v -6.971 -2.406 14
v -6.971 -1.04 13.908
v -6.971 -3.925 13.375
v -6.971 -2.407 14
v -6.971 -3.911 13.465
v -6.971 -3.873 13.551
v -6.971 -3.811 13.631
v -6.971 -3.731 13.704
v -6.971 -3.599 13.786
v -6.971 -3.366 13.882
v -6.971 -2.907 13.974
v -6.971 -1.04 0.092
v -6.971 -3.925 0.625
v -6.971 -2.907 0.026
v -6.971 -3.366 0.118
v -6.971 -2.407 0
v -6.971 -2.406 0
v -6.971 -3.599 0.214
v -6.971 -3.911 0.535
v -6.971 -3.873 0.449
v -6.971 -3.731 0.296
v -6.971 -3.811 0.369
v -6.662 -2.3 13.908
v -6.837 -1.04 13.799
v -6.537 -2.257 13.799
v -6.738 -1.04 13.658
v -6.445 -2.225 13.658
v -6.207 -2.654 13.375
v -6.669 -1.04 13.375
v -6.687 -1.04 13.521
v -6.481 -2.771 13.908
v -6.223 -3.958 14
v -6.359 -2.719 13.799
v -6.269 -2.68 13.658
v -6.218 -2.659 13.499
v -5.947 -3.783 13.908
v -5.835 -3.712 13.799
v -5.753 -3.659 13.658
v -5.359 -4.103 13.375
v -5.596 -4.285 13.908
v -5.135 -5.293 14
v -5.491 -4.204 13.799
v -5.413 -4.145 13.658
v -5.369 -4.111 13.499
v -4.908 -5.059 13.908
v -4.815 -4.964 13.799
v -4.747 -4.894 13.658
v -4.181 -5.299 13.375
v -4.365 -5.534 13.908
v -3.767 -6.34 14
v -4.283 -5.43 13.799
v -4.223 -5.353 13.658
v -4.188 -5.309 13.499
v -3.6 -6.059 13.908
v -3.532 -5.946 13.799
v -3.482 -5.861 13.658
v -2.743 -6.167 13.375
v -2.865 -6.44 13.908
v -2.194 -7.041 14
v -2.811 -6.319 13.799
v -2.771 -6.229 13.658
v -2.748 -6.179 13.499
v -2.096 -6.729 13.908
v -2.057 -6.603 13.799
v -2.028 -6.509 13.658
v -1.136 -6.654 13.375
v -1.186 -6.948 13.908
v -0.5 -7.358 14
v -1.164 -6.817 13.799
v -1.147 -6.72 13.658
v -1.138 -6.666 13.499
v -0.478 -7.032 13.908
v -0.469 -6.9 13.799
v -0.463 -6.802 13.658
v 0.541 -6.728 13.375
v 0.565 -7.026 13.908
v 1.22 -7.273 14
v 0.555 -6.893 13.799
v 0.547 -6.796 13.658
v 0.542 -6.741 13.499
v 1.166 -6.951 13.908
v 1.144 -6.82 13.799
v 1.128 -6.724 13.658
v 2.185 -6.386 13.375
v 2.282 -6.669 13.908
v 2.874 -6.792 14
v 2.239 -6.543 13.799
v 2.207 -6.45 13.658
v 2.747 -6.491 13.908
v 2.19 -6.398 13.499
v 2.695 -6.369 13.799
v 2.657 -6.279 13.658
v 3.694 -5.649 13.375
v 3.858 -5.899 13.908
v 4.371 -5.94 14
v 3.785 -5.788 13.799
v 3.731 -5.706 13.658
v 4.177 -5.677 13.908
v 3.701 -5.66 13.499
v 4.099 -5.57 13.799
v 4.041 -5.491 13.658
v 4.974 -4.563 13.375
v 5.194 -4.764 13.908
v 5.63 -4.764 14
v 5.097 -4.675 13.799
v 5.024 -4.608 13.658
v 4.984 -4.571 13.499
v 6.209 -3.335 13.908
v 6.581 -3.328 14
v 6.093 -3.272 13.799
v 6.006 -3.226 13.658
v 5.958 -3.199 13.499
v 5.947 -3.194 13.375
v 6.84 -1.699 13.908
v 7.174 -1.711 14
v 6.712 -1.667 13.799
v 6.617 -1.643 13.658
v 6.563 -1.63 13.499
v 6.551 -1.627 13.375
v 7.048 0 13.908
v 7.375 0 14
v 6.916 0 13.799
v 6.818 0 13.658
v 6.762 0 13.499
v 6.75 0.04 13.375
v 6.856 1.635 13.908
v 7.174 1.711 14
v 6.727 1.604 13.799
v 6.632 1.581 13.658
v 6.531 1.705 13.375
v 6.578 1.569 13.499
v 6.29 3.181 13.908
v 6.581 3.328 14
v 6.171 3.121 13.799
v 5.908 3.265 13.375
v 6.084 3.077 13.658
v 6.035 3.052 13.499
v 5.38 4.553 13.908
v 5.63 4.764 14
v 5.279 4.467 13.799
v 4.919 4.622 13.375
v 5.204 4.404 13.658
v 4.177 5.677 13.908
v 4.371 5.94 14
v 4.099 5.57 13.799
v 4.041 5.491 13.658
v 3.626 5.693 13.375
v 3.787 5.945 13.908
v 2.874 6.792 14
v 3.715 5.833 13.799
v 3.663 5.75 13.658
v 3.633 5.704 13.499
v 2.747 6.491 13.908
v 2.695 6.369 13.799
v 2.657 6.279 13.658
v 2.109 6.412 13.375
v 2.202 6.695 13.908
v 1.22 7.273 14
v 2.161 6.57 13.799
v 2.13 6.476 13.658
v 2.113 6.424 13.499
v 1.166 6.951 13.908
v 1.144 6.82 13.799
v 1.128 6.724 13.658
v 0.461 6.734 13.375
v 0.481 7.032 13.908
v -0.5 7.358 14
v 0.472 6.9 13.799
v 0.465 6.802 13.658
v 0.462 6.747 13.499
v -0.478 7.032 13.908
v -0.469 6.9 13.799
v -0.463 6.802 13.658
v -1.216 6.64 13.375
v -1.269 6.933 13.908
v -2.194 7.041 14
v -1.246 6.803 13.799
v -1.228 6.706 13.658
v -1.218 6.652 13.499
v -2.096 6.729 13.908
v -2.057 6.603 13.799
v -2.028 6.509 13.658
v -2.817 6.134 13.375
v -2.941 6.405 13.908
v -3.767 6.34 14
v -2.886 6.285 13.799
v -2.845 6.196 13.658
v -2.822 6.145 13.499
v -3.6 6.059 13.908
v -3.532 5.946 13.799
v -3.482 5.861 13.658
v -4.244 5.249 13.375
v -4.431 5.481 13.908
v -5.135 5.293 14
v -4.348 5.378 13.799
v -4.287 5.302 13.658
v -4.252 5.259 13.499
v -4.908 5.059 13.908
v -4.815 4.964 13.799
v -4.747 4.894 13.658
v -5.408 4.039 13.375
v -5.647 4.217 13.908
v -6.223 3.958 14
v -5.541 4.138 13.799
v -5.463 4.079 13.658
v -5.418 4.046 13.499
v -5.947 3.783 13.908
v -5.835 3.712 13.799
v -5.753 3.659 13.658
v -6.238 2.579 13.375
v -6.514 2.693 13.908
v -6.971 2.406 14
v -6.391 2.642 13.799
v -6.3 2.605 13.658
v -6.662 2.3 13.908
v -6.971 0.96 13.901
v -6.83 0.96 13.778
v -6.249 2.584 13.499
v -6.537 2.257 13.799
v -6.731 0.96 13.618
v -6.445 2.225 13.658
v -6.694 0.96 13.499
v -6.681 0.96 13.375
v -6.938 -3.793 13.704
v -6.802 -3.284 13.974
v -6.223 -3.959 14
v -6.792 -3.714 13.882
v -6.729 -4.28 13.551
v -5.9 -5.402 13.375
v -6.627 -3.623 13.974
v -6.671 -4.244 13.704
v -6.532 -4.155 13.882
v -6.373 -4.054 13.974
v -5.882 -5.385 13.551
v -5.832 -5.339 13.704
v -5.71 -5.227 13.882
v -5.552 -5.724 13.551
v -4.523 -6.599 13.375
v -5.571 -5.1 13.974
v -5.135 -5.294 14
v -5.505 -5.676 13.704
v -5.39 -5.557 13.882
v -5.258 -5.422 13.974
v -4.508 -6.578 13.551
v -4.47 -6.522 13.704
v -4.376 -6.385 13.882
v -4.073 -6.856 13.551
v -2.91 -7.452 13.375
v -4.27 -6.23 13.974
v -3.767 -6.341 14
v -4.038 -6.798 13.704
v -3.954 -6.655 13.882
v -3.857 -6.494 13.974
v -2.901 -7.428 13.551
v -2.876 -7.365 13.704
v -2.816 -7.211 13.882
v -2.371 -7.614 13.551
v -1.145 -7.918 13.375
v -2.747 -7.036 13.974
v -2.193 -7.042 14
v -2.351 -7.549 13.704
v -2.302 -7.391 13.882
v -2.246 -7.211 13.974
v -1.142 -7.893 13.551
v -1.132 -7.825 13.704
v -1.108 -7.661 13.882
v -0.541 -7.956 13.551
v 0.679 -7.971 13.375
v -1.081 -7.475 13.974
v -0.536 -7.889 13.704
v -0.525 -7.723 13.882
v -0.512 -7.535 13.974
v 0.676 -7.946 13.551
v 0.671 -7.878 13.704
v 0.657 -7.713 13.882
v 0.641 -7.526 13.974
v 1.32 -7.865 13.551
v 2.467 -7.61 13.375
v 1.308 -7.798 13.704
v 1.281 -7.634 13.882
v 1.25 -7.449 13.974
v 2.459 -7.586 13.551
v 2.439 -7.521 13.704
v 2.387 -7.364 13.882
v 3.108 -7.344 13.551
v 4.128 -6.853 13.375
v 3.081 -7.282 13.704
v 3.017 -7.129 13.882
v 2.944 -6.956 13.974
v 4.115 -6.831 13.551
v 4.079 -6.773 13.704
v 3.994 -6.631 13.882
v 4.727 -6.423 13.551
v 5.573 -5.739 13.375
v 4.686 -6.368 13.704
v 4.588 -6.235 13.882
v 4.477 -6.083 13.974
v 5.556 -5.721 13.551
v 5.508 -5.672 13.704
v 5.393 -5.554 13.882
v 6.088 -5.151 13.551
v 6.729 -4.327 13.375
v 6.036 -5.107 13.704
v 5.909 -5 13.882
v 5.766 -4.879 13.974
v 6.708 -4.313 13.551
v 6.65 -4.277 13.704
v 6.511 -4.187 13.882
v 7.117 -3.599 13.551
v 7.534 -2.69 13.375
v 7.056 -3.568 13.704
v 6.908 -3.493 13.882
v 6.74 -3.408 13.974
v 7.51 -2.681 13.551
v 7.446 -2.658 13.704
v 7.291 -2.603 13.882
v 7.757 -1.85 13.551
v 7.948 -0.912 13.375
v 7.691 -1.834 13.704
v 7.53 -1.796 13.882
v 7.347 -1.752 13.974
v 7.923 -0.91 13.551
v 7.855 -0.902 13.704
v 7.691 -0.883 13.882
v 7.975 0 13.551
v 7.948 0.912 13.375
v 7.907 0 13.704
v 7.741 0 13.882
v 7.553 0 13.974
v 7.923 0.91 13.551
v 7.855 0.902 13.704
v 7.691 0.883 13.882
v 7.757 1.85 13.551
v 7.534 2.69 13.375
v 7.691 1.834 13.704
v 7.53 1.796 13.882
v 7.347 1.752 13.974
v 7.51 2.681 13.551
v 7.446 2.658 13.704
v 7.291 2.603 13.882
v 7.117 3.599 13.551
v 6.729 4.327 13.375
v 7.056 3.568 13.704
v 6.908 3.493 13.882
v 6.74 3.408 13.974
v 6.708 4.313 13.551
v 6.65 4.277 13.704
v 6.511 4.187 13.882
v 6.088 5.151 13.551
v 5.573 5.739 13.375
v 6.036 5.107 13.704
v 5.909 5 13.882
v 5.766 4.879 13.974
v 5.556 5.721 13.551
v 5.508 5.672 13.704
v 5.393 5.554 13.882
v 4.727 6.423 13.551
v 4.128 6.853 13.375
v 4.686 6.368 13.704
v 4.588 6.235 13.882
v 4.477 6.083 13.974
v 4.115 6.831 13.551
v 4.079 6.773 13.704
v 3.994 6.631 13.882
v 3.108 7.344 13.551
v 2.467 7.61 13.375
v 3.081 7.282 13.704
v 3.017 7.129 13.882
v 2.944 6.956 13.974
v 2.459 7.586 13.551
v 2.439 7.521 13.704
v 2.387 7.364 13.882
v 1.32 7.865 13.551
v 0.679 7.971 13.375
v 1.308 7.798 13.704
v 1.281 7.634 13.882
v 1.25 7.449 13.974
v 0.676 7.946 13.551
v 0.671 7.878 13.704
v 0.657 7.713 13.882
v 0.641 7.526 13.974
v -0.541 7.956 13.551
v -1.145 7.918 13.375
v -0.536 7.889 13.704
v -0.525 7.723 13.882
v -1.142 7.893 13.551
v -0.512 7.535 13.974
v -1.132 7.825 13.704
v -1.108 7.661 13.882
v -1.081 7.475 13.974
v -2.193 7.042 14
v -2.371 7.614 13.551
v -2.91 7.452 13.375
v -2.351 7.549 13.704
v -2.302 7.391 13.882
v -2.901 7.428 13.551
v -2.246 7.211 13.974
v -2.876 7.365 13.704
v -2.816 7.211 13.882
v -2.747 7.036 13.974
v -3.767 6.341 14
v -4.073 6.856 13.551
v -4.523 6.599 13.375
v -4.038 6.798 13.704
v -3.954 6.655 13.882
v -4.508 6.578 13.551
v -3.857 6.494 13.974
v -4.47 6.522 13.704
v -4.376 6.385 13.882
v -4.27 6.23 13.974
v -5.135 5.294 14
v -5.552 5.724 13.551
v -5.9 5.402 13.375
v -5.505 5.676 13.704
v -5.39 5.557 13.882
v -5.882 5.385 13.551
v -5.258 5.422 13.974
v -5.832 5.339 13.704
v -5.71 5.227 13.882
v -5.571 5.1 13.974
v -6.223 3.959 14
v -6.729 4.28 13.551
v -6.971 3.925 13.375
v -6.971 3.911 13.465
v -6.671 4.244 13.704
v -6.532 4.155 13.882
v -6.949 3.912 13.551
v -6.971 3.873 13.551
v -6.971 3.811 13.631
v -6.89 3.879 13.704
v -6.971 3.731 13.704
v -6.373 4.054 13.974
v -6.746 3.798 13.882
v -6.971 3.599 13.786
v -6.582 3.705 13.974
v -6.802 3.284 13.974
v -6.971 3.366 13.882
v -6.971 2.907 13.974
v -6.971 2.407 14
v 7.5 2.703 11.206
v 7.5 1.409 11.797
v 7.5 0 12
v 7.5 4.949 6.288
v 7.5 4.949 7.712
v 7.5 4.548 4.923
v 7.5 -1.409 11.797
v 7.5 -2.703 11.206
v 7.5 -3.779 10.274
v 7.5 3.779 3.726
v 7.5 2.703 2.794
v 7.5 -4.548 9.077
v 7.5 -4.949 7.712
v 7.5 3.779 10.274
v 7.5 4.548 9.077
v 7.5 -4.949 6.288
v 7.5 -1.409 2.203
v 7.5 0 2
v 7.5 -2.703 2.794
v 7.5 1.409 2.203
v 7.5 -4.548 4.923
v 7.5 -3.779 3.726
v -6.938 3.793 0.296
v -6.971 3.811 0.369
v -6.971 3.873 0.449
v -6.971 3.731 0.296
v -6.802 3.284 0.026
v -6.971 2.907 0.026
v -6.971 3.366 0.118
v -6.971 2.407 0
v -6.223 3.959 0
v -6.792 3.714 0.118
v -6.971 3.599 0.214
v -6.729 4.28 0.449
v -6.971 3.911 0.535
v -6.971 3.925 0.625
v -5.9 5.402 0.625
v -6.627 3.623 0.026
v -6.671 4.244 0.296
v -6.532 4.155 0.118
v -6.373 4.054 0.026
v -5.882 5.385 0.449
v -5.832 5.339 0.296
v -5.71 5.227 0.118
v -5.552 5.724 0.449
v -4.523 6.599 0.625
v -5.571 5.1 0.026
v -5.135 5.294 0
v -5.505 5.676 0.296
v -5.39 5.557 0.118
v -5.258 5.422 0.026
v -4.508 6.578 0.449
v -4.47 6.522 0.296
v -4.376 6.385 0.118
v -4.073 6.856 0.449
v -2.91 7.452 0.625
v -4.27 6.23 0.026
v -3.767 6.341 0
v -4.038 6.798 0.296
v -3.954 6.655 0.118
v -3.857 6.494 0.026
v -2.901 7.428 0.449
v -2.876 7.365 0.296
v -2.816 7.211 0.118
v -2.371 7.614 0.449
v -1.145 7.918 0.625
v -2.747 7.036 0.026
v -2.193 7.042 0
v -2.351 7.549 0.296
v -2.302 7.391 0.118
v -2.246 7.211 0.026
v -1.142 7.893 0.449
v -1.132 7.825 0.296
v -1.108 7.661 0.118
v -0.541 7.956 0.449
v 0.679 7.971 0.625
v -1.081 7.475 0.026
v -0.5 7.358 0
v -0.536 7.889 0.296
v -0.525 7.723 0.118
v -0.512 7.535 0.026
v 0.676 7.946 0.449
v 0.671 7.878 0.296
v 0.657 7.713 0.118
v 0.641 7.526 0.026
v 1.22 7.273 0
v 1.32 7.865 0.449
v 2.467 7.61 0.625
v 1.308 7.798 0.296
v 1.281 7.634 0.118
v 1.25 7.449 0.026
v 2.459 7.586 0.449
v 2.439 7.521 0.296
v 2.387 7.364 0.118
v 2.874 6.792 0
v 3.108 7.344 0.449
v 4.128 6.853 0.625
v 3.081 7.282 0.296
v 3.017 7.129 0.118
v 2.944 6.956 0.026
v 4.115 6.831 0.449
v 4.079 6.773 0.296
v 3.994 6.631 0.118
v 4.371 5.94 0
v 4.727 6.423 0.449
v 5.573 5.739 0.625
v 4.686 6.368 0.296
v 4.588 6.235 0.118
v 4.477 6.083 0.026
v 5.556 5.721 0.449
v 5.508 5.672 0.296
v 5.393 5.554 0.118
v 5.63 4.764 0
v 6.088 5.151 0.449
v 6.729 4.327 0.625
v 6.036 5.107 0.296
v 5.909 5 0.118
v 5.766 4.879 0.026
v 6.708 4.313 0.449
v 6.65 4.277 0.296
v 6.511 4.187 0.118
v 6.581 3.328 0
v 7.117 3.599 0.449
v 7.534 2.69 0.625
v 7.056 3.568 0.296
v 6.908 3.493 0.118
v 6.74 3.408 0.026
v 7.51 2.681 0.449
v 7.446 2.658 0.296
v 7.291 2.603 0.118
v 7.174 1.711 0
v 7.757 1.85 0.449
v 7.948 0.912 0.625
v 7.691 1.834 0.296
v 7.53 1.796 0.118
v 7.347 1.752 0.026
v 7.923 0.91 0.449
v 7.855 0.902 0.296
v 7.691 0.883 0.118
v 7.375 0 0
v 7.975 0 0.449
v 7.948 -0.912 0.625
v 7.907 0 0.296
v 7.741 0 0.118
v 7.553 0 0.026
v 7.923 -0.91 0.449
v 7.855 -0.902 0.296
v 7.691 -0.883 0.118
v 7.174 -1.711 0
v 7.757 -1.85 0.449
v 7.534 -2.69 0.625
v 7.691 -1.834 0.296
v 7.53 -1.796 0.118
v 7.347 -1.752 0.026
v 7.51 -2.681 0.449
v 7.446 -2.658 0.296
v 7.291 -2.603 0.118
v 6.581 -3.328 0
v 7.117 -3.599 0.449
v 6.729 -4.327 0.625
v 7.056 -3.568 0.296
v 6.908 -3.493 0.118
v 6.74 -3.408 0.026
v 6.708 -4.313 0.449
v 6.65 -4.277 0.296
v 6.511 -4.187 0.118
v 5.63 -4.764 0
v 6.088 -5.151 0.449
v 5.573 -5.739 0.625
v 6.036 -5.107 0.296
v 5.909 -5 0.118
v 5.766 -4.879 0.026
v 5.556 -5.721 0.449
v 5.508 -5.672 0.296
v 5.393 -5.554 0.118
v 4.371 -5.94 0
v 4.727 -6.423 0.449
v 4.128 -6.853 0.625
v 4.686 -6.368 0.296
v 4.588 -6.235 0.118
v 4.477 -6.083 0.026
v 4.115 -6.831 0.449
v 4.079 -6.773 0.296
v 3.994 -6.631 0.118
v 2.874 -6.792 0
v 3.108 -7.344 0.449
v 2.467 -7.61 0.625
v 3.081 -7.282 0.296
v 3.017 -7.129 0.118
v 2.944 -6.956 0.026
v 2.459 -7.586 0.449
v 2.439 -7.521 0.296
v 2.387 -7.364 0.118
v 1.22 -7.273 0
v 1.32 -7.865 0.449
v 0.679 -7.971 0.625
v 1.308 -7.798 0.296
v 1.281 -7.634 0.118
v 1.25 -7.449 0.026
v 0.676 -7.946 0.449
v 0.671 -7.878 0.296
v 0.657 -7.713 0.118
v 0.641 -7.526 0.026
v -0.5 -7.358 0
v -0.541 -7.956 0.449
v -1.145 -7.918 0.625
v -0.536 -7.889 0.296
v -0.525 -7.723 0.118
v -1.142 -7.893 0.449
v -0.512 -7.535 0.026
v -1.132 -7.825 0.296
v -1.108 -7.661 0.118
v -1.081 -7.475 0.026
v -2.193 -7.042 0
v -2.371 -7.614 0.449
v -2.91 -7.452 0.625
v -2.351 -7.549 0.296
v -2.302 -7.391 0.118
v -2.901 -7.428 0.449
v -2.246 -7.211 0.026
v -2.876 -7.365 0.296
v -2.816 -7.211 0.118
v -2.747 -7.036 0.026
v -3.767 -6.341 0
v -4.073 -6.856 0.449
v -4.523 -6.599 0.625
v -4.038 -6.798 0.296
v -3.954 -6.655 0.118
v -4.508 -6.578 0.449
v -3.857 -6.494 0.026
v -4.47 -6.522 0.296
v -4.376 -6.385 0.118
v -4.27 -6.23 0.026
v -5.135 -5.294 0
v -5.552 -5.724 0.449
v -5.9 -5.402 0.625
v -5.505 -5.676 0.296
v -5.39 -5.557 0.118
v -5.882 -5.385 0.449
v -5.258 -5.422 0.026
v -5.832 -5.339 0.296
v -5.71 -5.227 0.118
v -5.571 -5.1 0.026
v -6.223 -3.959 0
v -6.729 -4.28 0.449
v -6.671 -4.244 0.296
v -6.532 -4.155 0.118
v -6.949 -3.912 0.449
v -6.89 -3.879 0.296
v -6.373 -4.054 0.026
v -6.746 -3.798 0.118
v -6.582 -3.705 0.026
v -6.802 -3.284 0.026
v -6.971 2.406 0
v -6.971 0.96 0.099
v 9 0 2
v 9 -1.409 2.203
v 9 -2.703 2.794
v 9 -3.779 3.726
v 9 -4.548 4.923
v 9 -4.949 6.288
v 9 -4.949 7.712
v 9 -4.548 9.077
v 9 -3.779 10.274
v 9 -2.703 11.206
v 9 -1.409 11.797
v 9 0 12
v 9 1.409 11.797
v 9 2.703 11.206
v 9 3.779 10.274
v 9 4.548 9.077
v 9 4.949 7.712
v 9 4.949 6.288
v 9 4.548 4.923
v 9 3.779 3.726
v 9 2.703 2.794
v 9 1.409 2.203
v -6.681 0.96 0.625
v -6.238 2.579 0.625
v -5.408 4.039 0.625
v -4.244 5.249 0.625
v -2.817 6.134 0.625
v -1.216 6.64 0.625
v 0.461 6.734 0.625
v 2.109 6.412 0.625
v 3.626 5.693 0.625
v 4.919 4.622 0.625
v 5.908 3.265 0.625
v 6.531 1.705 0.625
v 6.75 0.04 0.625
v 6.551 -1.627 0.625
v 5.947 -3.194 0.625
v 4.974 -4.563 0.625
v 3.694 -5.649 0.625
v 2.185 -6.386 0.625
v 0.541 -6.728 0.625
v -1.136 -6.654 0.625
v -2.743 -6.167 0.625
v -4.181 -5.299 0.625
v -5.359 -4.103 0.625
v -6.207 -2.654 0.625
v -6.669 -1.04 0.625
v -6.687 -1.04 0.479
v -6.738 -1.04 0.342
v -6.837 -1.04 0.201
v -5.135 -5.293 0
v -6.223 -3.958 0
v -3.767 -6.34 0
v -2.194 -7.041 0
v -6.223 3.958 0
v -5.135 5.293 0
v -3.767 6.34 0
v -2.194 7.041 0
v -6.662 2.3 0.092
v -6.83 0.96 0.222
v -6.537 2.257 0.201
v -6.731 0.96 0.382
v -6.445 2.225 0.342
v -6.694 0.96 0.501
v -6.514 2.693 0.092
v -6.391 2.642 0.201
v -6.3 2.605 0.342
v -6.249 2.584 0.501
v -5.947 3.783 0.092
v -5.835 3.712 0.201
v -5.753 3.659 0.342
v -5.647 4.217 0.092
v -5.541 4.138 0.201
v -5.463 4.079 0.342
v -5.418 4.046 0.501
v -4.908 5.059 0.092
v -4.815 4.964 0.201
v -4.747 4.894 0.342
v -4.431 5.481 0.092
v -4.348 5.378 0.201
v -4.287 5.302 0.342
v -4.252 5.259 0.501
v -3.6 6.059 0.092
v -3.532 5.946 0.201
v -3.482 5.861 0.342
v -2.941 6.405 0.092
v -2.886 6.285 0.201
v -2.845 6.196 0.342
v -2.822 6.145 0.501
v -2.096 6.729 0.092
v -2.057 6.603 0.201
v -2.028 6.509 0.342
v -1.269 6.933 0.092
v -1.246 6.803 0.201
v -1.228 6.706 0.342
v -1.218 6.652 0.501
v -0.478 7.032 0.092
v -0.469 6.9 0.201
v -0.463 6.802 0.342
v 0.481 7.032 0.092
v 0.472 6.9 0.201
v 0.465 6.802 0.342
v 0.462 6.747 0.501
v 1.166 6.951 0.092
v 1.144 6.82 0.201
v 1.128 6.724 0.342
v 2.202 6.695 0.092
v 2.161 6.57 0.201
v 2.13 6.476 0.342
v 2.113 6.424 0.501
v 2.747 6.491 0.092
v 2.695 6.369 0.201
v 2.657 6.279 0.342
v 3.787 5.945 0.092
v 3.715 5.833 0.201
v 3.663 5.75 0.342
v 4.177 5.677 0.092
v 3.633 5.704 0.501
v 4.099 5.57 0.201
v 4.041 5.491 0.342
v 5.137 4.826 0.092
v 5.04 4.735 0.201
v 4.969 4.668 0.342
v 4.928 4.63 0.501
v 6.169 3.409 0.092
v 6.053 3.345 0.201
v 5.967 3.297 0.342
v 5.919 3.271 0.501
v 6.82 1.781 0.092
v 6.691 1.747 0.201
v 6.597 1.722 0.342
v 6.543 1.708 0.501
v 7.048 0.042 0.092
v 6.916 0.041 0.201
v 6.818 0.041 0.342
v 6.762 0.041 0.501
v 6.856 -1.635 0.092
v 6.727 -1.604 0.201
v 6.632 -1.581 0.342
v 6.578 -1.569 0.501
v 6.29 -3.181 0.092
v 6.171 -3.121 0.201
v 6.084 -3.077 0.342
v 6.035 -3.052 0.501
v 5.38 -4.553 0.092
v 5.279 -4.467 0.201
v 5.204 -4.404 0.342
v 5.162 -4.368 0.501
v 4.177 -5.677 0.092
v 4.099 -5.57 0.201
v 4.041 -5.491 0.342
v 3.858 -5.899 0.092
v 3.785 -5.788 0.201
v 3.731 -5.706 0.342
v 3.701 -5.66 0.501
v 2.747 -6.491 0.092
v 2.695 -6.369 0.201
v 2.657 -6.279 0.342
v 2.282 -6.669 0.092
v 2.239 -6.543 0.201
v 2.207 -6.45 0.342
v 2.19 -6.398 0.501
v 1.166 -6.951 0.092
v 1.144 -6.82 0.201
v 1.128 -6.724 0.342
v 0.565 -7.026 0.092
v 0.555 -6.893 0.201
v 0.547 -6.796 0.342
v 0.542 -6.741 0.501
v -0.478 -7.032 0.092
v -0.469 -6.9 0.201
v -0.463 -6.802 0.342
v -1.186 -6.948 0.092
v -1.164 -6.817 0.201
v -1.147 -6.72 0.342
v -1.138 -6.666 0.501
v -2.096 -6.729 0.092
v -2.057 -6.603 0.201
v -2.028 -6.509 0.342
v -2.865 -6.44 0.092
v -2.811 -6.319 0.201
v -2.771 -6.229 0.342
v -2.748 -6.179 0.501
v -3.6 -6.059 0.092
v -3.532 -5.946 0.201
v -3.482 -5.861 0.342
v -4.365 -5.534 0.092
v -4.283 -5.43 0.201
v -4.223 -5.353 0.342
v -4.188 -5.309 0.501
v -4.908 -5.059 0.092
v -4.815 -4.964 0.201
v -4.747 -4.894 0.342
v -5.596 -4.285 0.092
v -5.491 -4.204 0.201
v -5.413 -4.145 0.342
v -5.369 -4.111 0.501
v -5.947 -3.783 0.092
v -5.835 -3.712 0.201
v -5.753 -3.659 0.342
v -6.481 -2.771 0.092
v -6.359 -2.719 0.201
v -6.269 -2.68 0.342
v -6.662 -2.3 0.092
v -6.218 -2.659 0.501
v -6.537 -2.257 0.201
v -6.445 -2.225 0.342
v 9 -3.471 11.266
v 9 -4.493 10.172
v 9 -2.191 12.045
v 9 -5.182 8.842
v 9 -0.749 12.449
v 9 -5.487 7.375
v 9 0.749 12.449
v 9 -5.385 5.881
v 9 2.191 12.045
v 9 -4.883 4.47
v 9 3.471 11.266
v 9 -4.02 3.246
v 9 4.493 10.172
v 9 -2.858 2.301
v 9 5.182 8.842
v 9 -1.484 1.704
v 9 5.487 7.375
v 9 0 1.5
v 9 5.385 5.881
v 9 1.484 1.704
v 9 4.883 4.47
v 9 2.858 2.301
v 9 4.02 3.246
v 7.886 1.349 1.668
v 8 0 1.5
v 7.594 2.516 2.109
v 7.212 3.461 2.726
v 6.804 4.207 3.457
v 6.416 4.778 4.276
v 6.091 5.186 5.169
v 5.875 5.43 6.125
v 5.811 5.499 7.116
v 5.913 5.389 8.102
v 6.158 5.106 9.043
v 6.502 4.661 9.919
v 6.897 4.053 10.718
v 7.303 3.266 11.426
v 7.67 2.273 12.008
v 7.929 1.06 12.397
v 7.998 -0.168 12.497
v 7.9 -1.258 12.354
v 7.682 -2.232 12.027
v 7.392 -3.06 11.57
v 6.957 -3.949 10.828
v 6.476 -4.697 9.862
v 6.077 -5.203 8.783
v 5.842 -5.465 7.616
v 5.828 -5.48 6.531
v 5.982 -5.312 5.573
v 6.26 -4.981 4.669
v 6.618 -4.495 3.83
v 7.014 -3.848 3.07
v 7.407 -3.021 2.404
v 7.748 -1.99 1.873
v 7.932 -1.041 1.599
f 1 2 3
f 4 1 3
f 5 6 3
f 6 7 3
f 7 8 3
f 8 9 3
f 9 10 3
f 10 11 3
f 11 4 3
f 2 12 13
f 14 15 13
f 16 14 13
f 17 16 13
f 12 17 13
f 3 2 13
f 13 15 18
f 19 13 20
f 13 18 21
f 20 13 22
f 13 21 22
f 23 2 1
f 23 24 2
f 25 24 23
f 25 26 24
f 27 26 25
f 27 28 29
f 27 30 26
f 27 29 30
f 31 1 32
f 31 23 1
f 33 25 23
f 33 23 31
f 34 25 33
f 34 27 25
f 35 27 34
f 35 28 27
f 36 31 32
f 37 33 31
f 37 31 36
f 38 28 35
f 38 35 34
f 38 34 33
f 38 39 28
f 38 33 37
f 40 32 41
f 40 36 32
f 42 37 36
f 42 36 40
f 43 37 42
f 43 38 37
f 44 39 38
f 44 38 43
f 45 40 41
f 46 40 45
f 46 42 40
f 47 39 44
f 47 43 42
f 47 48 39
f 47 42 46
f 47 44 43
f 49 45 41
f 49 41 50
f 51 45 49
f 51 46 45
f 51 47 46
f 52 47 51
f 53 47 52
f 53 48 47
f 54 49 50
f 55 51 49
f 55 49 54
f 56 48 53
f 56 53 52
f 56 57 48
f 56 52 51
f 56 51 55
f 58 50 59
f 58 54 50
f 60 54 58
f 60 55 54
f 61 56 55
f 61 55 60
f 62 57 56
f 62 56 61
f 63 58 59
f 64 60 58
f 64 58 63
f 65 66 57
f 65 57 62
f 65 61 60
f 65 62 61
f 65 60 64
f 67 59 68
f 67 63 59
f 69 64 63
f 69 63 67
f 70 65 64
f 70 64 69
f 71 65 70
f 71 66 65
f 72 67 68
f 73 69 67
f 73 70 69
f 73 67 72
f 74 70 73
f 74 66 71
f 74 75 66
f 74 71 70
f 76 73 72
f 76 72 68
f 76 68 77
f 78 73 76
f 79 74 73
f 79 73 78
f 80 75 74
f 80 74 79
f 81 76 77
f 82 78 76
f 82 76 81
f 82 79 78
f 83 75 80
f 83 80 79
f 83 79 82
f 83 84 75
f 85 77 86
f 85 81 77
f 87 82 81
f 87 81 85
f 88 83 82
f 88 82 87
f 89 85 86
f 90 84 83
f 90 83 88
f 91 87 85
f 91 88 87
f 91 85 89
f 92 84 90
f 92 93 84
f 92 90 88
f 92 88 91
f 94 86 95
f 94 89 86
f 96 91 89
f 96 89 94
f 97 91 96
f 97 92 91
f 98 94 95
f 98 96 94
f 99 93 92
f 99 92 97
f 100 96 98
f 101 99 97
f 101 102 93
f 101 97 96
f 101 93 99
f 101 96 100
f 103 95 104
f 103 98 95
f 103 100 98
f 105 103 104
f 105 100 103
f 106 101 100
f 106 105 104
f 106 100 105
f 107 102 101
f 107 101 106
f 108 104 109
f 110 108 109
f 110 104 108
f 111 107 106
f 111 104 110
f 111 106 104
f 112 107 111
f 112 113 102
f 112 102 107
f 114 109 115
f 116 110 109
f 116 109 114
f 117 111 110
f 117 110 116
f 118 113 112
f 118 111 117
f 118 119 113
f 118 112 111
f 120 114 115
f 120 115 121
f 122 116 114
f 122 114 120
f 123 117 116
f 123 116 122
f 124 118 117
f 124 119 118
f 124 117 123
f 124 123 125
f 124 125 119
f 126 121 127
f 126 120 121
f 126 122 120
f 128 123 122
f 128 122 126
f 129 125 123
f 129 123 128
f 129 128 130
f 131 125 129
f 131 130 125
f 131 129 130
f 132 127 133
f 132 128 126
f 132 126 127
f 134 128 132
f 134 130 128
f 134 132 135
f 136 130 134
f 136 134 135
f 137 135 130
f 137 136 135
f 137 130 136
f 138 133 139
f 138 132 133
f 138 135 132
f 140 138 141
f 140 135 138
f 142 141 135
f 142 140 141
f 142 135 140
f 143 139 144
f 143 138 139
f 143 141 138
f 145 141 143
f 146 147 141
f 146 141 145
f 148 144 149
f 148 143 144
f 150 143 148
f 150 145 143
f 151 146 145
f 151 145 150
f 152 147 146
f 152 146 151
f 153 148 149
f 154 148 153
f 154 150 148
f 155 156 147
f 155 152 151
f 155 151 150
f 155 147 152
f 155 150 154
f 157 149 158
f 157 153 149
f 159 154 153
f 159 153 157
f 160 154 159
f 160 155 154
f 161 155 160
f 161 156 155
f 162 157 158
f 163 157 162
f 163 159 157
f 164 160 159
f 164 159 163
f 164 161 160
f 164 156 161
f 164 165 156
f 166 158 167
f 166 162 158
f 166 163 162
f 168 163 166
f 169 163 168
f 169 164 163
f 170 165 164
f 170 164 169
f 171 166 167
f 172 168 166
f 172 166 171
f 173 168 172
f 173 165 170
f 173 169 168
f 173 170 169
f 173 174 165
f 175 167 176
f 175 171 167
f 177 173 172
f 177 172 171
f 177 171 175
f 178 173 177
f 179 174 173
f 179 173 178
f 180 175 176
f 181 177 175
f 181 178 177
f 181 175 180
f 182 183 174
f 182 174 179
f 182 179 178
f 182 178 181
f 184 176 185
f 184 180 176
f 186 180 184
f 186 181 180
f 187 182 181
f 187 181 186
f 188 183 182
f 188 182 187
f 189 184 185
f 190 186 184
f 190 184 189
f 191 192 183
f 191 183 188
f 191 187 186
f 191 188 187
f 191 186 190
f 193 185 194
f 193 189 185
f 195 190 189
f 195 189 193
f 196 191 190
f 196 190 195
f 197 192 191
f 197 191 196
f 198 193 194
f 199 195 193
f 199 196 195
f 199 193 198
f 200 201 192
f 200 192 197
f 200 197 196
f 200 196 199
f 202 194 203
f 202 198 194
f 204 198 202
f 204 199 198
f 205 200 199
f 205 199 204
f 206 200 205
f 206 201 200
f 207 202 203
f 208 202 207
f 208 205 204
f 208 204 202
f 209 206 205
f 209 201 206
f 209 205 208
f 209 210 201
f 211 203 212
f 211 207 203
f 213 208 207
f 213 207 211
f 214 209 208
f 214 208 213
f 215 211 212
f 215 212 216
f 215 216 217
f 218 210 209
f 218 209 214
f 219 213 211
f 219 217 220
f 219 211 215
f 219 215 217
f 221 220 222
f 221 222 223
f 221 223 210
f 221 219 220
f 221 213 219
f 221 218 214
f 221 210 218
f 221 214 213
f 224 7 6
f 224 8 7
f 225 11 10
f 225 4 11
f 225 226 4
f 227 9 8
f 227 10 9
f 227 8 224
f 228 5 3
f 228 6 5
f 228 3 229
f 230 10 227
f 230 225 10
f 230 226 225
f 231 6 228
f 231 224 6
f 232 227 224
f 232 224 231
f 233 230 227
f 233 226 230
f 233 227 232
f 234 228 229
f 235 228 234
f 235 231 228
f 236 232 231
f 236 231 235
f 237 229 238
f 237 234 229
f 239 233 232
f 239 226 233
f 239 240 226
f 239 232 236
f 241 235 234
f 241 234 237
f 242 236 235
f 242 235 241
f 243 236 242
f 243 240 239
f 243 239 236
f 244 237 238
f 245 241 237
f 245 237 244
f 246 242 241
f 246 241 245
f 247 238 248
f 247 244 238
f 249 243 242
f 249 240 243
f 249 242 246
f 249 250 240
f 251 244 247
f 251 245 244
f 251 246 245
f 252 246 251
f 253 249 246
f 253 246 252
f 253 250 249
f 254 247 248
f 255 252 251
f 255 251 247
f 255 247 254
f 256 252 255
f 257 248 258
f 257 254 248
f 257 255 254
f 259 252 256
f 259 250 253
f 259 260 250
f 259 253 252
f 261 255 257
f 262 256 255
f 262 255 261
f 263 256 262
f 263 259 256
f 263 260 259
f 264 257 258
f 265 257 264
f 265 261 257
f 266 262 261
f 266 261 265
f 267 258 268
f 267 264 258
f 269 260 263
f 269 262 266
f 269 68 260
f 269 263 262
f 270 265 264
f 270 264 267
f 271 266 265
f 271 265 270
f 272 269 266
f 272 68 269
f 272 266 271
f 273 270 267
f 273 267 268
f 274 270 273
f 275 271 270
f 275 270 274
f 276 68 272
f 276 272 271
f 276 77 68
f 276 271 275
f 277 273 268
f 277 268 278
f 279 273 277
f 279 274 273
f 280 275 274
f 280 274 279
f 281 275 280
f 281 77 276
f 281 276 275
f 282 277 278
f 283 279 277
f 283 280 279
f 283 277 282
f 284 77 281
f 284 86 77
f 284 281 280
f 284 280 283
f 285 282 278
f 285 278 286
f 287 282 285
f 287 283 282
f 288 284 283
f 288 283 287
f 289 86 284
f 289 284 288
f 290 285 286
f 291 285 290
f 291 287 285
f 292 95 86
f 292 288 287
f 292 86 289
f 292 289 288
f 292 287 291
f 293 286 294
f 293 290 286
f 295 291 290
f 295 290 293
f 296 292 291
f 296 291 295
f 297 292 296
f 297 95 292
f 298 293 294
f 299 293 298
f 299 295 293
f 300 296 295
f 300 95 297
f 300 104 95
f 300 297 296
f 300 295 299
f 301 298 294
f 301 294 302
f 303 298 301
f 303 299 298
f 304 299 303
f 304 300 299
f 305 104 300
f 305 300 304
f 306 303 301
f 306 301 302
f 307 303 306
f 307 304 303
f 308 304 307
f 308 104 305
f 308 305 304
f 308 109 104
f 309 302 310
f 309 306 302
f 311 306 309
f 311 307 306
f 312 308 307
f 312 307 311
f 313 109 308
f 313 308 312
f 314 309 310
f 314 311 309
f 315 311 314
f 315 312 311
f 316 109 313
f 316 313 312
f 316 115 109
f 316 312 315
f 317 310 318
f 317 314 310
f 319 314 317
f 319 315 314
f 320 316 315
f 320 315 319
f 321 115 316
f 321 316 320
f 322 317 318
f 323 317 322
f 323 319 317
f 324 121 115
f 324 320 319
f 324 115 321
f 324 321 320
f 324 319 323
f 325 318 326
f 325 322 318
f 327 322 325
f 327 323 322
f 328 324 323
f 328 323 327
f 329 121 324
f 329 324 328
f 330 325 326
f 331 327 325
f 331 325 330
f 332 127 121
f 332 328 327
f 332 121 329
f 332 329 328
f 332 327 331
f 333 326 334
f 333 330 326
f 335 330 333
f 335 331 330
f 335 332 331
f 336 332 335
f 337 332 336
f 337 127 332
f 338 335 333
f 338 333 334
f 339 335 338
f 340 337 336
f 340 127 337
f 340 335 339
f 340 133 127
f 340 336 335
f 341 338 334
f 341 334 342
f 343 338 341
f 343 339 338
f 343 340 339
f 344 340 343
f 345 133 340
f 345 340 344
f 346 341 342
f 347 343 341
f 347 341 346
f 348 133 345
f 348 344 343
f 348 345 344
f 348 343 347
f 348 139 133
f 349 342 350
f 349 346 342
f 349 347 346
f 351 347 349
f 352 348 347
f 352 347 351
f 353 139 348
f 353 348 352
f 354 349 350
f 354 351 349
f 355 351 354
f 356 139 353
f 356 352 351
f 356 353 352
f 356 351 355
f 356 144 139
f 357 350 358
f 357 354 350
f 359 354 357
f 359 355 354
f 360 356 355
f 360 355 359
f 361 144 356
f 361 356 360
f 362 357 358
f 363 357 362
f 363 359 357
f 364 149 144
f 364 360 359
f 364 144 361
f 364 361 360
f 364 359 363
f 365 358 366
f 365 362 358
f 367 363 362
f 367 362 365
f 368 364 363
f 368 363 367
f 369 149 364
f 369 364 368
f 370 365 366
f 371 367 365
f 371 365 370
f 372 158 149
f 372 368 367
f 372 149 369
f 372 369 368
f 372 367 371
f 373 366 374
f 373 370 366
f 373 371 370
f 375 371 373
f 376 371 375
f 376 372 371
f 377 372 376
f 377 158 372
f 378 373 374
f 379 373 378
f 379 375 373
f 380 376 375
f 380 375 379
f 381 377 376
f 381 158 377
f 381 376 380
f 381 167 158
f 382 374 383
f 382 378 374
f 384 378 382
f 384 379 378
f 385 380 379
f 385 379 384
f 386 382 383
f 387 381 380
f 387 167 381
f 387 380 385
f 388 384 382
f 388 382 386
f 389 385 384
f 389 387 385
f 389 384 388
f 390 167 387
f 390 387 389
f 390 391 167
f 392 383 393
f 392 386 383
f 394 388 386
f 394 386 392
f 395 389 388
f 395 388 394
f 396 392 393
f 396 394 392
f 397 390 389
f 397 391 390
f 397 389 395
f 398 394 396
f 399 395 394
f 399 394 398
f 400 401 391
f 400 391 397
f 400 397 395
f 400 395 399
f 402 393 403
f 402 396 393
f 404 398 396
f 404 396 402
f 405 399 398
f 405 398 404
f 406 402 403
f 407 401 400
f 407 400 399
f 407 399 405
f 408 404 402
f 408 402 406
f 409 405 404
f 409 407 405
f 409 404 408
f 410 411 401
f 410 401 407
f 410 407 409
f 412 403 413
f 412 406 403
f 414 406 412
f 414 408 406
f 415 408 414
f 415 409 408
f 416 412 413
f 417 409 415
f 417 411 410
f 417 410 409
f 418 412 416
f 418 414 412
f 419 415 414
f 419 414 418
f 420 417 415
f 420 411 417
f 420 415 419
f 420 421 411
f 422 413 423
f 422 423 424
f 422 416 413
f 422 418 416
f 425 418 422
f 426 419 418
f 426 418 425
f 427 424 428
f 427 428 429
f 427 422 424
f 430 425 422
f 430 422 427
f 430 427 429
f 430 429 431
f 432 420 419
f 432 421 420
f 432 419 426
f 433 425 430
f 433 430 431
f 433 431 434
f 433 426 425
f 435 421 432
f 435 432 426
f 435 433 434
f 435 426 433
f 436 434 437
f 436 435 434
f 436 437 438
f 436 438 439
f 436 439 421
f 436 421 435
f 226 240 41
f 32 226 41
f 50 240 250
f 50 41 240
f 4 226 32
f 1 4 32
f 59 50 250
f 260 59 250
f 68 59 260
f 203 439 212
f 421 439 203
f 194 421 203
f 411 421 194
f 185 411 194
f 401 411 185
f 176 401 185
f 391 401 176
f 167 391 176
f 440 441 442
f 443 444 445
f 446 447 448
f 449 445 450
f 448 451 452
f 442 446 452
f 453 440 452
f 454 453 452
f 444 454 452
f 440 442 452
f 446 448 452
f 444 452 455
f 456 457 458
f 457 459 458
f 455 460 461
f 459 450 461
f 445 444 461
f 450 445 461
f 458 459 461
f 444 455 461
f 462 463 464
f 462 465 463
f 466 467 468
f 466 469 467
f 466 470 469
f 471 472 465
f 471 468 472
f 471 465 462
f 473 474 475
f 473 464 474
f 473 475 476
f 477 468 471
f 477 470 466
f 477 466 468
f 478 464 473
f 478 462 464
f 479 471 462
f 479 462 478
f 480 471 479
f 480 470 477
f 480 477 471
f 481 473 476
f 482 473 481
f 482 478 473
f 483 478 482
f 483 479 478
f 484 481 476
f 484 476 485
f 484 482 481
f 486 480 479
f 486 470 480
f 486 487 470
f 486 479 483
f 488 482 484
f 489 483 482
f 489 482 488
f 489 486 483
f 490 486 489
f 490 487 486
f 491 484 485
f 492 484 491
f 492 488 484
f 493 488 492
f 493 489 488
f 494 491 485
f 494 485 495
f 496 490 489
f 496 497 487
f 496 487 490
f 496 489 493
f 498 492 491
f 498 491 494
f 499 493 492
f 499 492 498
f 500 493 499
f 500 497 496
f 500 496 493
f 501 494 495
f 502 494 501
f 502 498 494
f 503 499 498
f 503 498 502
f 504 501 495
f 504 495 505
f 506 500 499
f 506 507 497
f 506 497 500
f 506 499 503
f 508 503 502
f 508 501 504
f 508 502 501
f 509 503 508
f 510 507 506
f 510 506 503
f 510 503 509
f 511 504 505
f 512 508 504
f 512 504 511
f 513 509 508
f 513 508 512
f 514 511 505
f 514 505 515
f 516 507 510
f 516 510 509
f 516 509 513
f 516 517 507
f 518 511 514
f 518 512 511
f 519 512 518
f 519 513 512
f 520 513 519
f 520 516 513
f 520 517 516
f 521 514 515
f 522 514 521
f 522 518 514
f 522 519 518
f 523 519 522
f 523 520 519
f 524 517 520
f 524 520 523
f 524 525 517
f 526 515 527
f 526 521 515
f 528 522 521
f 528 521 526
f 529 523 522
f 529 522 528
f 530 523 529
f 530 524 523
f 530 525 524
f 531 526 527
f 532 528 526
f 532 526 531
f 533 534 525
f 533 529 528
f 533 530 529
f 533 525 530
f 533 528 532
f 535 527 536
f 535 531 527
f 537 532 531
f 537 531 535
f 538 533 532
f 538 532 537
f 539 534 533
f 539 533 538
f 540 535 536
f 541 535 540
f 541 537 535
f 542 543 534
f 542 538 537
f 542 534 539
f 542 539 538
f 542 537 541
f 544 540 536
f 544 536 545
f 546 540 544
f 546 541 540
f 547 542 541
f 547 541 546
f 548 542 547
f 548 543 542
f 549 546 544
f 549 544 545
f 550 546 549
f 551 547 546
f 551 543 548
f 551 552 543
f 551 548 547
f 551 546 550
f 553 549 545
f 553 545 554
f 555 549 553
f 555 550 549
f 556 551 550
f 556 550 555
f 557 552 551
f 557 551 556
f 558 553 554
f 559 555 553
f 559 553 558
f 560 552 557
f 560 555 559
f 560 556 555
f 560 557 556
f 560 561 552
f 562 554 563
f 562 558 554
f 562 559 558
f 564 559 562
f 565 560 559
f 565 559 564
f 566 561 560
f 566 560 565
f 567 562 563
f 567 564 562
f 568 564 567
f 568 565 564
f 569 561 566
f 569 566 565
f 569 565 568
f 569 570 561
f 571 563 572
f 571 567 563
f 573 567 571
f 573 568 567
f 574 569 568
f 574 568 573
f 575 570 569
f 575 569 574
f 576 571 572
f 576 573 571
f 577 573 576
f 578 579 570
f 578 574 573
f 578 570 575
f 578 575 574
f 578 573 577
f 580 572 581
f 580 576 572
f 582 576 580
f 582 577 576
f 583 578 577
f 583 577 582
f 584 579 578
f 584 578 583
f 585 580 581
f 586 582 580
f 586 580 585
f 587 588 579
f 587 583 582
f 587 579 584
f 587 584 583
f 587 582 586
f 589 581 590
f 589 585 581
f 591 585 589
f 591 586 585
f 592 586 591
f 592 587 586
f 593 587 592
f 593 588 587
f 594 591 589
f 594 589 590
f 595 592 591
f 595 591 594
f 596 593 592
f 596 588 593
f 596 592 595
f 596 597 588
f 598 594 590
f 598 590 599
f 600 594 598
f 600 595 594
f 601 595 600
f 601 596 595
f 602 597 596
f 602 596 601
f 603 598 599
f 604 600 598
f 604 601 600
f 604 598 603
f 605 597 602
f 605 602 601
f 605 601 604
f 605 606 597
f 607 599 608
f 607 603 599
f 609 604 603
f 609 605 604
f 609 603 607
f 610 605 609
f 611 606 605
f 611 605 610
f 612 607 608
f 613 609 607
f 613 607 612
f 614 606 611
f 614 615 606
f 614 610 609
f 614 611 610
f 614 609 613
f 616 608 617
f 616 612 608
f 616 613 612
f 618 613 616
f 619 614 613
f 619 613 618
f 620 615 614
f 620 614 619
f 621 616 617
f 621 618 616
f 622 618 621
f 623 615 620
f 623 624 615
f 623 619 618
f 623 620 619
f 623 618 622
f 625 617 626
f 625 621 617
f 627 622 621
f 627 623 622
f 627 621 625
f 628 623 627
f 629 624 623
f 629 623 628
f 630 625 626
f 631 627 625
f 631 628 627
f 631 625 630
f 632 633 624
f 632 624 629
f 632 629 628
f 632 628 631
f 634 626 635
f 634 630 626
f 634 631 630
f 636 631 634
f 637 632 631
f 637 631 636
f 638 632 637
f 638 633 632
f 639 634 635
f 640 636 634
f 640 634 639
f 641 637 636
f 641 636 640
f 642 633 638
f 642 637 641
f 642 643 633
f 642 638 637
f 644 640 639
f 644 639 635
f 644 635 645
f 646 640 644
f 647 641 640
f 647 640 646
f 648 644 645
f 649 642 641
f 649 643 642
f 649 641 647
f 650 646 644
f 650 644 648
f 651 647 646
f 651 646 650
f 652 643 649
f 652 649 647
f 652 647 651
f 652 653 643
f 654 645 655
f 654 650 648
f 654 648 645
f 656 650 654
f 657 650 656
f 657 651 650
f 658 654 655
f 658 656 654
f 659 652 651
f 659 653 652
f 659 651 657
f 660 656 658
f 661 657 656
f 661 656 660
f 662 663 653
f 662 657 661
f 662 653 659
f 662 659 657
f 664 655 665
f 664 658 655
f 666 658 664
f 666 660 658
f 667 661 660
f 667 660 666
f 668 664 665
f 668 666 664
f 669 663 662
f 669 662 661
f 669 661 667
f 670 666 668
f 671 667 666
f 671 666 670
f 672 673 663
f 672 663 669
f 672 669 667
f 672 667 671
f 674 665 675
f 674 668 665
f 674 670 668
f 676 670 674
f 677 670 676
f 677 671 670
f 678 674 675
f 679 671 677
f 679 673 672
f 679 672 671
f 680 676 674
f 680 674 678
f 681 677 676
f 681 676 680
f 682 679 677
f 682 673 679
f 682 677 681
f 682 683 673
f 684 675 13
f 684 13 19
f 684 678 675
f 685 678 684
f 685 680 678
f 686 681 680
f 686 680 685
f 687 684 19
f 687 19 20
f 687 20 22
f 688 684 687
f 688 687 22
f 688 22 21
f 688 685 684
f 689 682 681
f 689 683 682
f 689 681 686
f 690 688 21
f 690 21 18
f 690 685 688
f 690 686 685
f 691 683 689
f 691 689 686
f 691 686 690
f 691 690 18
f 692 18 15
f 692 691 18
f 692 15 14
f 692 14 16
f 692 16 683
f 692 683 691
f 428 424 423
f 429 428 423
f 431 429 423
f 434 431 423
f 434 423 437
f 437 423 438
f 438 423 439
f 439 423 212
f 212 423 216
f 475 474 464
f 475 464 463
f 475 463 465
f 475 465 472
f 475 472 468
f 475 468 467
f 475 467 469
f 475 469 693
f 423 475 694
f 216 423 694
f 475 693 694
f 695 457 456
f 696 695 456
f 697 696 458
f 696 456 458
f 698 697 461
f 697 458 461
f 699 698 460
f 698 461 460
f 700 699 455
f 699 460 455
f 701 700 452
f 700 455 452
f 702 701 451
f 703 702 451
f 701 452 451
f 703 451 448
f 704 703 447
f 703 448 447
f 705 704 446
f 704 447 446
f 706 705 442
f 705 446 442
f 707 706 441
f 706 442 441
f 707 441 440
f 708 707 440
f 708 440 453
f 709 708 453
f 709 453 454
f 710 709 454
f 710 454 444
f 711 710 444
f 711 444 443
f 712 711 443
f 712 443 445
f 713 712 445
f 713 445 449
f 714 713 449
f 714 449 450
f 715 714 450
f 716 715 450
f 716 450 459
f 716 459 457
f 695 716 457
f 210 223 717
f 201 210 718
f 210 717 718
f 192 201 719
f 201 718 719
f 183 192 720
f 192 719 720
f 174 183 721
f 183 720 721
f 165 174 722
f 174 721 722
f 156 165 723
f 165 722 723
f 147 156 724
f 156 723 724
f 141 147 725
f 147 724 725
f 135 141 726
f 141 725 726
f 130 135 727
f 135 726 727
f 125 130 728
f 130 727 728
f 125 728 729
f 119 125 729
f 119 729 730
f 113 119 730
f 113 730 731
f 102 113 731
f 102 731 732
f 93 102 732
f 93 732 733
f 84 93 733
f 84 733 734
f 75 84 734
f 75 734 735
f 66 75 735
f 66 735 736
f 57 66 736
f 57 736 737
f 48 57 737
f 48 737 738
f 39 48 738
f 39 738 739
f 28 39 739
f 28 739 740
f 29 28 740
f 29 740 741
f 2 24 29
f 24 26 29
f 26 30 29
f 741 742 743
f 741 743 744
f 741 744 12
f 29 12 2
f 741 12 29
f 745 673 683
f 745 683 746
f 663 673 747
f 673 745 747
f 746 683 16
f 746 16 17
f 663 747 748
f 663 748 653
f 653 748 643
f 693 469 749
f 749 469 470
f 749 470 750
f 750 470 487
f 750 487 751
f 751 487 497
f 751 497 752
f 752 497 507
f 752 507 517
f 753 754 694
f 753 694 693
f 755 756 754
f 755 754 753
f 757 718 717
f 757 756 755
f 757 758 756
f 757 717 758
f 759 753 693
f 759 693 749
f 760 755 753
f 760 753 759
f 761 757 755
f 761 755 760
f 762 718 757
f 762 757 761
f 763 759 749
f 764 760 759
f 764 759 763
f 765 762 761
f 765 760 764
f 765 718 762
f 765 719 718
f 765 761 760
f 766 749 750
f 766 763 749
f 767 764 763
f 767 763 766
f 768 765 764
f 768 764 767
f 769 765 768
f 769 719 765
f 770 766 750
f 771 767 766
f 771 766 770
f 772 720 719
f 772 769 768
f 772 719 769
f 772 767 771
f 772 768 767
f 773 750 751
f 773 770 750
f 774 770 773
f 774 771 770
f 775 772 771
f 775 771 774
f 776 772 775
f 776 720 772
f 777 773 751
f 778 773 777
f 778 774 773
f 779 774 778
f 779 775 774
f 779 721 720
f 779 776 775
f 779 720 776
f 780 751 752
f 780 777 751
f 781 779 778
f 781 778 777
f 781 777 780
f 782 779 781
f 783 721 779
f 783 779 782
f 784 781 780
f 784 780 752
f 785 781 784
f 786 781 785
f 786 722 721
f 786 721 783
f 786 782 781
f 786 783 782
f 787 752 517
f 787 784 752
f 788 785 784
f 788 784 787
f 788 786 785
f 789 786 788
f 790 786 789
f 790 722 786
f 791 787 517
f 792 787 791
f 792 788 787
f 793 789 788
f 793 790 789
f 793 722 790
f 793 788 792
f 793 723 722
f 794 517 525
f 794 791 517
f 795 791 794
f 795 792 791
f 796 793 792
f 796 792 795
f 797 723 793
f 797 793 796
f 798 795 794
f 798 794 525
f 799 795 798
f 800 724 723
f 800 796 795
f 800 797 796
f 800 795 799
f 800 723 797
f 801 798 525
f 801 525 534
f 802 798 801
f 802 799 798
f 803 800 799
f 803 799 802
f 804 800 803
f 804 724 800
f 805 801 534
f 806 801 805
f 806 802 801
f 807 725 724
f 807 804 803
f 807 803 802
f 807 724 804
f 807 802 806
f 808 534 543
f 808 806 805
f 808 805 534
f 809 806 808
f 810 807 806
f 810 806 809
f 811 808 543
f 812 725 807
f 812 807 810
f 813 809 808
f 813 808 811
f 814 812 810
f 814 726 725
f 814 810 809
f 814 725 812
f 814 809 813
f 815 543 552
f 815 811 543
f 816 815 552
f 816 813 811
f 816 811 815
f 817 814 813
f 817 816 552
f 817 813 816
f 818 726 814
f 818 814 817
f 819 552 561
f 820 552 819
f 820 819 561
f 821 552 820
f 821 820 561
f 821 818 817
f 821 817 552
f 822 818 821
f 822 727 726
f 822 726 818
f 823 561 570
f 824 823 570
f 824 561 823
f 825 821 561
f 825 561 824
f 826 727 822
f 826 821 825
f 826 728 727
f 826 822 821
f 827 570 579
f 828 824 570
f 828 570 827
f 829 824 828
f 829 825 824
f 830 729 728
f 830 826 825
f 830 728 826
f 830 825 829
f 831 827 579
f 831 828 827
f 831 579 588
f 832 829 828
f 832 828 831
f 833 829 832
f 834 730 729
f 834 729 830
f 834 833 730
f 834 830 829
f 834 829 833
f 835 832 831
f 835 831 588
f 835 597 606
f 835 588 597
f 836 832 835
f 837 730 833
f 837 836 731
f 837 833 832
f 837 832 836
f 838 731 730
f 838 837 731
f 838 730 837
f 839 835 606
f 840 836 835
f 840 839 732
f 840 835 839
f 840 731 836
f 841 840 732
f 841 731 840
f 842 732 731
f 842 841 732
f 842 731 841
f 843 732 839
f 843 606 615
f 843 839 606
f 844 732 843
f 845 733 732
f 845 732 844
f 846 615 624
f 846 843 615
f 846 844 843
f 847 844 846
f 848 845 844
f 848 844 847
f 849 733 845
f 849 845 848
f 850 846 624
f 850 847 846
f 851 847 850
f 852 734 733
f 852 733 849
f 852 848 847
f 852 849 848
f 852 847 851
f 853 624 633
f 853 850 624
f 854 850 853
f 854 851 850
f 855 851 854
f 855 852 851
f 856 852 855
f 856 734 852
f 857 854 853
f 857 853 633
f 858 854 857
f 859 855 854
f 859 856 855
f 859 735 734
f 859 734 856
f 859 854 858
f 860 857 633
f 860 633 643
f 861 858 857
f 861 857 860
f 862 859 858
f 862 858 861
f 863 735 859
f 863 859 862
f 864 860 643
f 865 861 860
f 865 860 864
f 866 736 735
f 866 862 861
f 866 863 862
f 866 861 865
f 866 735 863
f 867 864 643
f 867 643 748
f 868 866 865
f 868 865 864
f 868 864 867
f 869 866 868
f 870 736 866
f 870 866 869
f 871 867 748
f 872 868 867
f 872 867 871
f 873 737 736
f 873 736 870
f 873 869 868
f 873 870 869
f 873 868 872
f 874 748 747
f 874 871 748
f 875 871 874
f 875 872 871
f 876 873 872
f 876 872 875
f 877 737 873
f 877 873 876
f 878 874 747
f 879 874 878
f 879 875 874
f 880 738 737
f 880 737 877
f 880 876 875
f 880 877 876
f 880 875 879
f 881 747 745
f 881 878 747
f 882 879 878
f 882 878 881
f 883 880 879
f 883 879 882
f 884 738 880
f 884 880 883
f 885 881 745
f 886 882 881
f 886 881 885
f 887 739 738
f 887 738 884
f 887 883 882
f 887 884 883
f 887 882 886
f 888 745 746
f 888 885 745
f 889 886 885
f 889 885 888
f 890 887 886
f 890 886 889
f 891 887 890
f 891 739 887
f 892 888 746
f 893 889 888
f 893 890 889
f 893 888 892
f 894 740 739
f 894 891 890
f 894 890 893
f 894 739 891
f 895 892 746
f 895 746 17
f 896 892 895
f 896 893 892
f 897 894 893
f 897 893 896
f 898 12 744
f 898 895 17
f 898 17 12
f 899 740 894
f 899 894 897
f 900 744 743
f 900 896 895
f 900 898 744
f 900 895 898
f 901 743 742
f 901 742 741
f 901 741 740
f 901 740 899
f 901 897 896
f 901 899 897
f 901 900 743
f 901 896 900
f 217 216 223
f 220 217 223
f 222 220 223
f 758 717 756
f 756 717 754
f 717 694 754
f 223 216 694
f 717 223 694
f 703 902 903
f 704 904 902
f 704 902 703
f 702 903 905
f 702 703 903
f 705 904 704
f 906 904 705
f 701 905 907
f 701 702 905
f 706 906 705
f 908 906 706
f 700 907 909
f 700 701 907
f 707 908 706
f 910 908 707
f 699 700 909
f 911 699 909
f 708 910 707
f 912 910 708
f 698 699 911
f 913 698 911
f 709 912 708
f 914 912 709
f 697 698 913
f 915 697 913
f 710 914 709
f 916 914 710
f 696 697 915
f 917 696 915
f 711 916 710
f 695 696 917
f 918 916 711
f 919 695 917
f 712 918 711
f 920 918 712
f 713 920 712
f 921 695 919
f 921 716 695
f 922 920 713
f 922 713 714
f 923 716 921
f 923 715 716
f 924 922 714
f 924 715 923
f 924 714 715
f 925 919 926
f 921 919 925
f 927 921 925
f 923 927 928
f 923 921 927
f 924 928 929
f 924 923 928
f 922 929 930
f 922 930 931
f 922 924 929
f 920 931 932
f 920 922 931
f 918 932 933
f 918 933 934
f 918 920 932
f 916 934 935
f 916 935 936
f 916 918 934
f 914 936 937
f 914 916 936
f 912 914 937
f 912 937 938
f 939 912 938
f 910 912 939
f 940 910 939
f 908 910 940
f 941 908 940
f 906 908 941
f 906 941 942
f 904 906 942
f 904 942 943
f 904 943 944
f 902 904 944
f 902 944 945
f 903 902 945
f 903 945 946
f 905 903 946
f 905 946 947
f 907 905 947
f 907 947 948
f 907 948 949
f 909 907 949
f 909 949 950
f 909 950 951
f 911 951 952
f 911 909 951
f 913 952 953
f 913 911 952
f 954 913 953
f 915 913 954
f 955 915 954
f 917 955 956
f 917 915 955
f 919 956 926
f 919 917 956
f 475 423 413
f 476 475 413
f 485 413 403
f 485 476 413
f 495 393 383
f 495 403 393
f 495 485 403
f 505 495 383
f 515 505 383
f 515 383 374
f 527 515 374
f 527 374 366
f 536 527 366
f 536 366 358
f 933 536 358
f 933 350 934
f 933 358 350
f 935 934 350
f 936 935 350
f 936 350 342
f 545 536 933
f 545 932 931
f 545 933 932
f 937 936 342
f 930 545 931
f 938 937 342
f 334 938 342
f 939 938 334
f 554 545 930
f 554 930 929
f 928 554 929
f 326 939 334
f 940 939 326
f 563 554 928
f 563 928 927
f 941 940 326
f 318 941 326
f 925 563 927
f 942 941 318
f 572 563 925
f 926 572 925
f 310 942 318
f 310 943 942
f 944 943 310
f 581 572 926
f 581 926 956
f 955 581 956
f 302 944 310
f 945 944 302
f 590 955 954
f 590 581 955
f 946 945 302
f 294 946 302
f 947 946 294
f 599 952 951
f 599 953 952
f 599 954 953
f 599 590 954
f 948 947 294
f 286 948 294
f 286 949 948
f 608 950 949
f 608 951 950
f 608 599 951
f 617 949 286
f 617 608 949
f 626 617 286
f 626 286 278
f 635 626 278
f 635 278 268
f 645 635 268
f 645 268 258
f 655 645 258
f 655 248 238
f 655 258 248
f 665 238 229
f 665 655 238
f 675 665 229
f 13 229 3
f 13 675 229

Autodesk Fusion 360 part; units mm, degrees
sketch "スケッチ4" plane through (0, 0, 0) normal (0, 0, 1) x (1, 0, 0) in component "指輪"
  arc A0 (-6.9712, -3.9246) -> (-6.9712, 3.9246) centre (0, 0) ccw
  line L0 (-6.9712, 0.9595) -> (-0.9758, 0.9595)
  line L1 (-0.9758, 0.9595) -> (-0.9758, -1.0395)
  line L2 (-0.9758, -1.0395) -> (-6.9712, -1.0395)
  line L3 (-6.9712, 3.9246) -> (-6.9712, 0.9595)
  line L4 (-6.9712, -1.0395) -> (-6.9712, -3.9246)
  dimension "d29" = 16
extrude "押し出し1" add sketch "スケッチ4" along normal blind 14 makes body 1 in component "指輪"
cylinder "円柱プリミティブ1" add diameter 11 height 6 placed x (0, 0, -1) y (0, 1, 0) z (1, 0, 0) at (0, 23.0583, 6.8926) separate body makes body 2
move_body "移動1" bodies 2 to x (1, 0, 0) y (0, 1, 0) z (0, 0, 1) at (0, -23.0583, -6.8926)
move_body "移動2" bodies 2 to x (1, 0, 0) y (0, 1, 0) z (0, 0, 1) at (3, 0, 7)
combine "結合2" operation add target body 1 tool bodies 2 in component "指輪"
hole "穴4" at (0, 0, 14) direction (0, 0, -1) diameter 13.5 depth 15 tip angle 180 bodies 1 in component "指輪"
hole "穴6" at (9, 0, 7) direction (-1, 0, 0) diameter 10 depth 1.5 tip angle 180 bodies 1 in component "指輪"
fillet "フィレット4" radius 0.625 4 edges at (8, 0, 14) (6.7499, 0.0404, 14) (8, 0, 0) (6.7499, 0.0404, 0) on bodies 1 in component "指輪"
component "指輪" placed x (1, 0, 0) y (0, 1, 0) z (0, 0, 1) at (0, 0, 0)
